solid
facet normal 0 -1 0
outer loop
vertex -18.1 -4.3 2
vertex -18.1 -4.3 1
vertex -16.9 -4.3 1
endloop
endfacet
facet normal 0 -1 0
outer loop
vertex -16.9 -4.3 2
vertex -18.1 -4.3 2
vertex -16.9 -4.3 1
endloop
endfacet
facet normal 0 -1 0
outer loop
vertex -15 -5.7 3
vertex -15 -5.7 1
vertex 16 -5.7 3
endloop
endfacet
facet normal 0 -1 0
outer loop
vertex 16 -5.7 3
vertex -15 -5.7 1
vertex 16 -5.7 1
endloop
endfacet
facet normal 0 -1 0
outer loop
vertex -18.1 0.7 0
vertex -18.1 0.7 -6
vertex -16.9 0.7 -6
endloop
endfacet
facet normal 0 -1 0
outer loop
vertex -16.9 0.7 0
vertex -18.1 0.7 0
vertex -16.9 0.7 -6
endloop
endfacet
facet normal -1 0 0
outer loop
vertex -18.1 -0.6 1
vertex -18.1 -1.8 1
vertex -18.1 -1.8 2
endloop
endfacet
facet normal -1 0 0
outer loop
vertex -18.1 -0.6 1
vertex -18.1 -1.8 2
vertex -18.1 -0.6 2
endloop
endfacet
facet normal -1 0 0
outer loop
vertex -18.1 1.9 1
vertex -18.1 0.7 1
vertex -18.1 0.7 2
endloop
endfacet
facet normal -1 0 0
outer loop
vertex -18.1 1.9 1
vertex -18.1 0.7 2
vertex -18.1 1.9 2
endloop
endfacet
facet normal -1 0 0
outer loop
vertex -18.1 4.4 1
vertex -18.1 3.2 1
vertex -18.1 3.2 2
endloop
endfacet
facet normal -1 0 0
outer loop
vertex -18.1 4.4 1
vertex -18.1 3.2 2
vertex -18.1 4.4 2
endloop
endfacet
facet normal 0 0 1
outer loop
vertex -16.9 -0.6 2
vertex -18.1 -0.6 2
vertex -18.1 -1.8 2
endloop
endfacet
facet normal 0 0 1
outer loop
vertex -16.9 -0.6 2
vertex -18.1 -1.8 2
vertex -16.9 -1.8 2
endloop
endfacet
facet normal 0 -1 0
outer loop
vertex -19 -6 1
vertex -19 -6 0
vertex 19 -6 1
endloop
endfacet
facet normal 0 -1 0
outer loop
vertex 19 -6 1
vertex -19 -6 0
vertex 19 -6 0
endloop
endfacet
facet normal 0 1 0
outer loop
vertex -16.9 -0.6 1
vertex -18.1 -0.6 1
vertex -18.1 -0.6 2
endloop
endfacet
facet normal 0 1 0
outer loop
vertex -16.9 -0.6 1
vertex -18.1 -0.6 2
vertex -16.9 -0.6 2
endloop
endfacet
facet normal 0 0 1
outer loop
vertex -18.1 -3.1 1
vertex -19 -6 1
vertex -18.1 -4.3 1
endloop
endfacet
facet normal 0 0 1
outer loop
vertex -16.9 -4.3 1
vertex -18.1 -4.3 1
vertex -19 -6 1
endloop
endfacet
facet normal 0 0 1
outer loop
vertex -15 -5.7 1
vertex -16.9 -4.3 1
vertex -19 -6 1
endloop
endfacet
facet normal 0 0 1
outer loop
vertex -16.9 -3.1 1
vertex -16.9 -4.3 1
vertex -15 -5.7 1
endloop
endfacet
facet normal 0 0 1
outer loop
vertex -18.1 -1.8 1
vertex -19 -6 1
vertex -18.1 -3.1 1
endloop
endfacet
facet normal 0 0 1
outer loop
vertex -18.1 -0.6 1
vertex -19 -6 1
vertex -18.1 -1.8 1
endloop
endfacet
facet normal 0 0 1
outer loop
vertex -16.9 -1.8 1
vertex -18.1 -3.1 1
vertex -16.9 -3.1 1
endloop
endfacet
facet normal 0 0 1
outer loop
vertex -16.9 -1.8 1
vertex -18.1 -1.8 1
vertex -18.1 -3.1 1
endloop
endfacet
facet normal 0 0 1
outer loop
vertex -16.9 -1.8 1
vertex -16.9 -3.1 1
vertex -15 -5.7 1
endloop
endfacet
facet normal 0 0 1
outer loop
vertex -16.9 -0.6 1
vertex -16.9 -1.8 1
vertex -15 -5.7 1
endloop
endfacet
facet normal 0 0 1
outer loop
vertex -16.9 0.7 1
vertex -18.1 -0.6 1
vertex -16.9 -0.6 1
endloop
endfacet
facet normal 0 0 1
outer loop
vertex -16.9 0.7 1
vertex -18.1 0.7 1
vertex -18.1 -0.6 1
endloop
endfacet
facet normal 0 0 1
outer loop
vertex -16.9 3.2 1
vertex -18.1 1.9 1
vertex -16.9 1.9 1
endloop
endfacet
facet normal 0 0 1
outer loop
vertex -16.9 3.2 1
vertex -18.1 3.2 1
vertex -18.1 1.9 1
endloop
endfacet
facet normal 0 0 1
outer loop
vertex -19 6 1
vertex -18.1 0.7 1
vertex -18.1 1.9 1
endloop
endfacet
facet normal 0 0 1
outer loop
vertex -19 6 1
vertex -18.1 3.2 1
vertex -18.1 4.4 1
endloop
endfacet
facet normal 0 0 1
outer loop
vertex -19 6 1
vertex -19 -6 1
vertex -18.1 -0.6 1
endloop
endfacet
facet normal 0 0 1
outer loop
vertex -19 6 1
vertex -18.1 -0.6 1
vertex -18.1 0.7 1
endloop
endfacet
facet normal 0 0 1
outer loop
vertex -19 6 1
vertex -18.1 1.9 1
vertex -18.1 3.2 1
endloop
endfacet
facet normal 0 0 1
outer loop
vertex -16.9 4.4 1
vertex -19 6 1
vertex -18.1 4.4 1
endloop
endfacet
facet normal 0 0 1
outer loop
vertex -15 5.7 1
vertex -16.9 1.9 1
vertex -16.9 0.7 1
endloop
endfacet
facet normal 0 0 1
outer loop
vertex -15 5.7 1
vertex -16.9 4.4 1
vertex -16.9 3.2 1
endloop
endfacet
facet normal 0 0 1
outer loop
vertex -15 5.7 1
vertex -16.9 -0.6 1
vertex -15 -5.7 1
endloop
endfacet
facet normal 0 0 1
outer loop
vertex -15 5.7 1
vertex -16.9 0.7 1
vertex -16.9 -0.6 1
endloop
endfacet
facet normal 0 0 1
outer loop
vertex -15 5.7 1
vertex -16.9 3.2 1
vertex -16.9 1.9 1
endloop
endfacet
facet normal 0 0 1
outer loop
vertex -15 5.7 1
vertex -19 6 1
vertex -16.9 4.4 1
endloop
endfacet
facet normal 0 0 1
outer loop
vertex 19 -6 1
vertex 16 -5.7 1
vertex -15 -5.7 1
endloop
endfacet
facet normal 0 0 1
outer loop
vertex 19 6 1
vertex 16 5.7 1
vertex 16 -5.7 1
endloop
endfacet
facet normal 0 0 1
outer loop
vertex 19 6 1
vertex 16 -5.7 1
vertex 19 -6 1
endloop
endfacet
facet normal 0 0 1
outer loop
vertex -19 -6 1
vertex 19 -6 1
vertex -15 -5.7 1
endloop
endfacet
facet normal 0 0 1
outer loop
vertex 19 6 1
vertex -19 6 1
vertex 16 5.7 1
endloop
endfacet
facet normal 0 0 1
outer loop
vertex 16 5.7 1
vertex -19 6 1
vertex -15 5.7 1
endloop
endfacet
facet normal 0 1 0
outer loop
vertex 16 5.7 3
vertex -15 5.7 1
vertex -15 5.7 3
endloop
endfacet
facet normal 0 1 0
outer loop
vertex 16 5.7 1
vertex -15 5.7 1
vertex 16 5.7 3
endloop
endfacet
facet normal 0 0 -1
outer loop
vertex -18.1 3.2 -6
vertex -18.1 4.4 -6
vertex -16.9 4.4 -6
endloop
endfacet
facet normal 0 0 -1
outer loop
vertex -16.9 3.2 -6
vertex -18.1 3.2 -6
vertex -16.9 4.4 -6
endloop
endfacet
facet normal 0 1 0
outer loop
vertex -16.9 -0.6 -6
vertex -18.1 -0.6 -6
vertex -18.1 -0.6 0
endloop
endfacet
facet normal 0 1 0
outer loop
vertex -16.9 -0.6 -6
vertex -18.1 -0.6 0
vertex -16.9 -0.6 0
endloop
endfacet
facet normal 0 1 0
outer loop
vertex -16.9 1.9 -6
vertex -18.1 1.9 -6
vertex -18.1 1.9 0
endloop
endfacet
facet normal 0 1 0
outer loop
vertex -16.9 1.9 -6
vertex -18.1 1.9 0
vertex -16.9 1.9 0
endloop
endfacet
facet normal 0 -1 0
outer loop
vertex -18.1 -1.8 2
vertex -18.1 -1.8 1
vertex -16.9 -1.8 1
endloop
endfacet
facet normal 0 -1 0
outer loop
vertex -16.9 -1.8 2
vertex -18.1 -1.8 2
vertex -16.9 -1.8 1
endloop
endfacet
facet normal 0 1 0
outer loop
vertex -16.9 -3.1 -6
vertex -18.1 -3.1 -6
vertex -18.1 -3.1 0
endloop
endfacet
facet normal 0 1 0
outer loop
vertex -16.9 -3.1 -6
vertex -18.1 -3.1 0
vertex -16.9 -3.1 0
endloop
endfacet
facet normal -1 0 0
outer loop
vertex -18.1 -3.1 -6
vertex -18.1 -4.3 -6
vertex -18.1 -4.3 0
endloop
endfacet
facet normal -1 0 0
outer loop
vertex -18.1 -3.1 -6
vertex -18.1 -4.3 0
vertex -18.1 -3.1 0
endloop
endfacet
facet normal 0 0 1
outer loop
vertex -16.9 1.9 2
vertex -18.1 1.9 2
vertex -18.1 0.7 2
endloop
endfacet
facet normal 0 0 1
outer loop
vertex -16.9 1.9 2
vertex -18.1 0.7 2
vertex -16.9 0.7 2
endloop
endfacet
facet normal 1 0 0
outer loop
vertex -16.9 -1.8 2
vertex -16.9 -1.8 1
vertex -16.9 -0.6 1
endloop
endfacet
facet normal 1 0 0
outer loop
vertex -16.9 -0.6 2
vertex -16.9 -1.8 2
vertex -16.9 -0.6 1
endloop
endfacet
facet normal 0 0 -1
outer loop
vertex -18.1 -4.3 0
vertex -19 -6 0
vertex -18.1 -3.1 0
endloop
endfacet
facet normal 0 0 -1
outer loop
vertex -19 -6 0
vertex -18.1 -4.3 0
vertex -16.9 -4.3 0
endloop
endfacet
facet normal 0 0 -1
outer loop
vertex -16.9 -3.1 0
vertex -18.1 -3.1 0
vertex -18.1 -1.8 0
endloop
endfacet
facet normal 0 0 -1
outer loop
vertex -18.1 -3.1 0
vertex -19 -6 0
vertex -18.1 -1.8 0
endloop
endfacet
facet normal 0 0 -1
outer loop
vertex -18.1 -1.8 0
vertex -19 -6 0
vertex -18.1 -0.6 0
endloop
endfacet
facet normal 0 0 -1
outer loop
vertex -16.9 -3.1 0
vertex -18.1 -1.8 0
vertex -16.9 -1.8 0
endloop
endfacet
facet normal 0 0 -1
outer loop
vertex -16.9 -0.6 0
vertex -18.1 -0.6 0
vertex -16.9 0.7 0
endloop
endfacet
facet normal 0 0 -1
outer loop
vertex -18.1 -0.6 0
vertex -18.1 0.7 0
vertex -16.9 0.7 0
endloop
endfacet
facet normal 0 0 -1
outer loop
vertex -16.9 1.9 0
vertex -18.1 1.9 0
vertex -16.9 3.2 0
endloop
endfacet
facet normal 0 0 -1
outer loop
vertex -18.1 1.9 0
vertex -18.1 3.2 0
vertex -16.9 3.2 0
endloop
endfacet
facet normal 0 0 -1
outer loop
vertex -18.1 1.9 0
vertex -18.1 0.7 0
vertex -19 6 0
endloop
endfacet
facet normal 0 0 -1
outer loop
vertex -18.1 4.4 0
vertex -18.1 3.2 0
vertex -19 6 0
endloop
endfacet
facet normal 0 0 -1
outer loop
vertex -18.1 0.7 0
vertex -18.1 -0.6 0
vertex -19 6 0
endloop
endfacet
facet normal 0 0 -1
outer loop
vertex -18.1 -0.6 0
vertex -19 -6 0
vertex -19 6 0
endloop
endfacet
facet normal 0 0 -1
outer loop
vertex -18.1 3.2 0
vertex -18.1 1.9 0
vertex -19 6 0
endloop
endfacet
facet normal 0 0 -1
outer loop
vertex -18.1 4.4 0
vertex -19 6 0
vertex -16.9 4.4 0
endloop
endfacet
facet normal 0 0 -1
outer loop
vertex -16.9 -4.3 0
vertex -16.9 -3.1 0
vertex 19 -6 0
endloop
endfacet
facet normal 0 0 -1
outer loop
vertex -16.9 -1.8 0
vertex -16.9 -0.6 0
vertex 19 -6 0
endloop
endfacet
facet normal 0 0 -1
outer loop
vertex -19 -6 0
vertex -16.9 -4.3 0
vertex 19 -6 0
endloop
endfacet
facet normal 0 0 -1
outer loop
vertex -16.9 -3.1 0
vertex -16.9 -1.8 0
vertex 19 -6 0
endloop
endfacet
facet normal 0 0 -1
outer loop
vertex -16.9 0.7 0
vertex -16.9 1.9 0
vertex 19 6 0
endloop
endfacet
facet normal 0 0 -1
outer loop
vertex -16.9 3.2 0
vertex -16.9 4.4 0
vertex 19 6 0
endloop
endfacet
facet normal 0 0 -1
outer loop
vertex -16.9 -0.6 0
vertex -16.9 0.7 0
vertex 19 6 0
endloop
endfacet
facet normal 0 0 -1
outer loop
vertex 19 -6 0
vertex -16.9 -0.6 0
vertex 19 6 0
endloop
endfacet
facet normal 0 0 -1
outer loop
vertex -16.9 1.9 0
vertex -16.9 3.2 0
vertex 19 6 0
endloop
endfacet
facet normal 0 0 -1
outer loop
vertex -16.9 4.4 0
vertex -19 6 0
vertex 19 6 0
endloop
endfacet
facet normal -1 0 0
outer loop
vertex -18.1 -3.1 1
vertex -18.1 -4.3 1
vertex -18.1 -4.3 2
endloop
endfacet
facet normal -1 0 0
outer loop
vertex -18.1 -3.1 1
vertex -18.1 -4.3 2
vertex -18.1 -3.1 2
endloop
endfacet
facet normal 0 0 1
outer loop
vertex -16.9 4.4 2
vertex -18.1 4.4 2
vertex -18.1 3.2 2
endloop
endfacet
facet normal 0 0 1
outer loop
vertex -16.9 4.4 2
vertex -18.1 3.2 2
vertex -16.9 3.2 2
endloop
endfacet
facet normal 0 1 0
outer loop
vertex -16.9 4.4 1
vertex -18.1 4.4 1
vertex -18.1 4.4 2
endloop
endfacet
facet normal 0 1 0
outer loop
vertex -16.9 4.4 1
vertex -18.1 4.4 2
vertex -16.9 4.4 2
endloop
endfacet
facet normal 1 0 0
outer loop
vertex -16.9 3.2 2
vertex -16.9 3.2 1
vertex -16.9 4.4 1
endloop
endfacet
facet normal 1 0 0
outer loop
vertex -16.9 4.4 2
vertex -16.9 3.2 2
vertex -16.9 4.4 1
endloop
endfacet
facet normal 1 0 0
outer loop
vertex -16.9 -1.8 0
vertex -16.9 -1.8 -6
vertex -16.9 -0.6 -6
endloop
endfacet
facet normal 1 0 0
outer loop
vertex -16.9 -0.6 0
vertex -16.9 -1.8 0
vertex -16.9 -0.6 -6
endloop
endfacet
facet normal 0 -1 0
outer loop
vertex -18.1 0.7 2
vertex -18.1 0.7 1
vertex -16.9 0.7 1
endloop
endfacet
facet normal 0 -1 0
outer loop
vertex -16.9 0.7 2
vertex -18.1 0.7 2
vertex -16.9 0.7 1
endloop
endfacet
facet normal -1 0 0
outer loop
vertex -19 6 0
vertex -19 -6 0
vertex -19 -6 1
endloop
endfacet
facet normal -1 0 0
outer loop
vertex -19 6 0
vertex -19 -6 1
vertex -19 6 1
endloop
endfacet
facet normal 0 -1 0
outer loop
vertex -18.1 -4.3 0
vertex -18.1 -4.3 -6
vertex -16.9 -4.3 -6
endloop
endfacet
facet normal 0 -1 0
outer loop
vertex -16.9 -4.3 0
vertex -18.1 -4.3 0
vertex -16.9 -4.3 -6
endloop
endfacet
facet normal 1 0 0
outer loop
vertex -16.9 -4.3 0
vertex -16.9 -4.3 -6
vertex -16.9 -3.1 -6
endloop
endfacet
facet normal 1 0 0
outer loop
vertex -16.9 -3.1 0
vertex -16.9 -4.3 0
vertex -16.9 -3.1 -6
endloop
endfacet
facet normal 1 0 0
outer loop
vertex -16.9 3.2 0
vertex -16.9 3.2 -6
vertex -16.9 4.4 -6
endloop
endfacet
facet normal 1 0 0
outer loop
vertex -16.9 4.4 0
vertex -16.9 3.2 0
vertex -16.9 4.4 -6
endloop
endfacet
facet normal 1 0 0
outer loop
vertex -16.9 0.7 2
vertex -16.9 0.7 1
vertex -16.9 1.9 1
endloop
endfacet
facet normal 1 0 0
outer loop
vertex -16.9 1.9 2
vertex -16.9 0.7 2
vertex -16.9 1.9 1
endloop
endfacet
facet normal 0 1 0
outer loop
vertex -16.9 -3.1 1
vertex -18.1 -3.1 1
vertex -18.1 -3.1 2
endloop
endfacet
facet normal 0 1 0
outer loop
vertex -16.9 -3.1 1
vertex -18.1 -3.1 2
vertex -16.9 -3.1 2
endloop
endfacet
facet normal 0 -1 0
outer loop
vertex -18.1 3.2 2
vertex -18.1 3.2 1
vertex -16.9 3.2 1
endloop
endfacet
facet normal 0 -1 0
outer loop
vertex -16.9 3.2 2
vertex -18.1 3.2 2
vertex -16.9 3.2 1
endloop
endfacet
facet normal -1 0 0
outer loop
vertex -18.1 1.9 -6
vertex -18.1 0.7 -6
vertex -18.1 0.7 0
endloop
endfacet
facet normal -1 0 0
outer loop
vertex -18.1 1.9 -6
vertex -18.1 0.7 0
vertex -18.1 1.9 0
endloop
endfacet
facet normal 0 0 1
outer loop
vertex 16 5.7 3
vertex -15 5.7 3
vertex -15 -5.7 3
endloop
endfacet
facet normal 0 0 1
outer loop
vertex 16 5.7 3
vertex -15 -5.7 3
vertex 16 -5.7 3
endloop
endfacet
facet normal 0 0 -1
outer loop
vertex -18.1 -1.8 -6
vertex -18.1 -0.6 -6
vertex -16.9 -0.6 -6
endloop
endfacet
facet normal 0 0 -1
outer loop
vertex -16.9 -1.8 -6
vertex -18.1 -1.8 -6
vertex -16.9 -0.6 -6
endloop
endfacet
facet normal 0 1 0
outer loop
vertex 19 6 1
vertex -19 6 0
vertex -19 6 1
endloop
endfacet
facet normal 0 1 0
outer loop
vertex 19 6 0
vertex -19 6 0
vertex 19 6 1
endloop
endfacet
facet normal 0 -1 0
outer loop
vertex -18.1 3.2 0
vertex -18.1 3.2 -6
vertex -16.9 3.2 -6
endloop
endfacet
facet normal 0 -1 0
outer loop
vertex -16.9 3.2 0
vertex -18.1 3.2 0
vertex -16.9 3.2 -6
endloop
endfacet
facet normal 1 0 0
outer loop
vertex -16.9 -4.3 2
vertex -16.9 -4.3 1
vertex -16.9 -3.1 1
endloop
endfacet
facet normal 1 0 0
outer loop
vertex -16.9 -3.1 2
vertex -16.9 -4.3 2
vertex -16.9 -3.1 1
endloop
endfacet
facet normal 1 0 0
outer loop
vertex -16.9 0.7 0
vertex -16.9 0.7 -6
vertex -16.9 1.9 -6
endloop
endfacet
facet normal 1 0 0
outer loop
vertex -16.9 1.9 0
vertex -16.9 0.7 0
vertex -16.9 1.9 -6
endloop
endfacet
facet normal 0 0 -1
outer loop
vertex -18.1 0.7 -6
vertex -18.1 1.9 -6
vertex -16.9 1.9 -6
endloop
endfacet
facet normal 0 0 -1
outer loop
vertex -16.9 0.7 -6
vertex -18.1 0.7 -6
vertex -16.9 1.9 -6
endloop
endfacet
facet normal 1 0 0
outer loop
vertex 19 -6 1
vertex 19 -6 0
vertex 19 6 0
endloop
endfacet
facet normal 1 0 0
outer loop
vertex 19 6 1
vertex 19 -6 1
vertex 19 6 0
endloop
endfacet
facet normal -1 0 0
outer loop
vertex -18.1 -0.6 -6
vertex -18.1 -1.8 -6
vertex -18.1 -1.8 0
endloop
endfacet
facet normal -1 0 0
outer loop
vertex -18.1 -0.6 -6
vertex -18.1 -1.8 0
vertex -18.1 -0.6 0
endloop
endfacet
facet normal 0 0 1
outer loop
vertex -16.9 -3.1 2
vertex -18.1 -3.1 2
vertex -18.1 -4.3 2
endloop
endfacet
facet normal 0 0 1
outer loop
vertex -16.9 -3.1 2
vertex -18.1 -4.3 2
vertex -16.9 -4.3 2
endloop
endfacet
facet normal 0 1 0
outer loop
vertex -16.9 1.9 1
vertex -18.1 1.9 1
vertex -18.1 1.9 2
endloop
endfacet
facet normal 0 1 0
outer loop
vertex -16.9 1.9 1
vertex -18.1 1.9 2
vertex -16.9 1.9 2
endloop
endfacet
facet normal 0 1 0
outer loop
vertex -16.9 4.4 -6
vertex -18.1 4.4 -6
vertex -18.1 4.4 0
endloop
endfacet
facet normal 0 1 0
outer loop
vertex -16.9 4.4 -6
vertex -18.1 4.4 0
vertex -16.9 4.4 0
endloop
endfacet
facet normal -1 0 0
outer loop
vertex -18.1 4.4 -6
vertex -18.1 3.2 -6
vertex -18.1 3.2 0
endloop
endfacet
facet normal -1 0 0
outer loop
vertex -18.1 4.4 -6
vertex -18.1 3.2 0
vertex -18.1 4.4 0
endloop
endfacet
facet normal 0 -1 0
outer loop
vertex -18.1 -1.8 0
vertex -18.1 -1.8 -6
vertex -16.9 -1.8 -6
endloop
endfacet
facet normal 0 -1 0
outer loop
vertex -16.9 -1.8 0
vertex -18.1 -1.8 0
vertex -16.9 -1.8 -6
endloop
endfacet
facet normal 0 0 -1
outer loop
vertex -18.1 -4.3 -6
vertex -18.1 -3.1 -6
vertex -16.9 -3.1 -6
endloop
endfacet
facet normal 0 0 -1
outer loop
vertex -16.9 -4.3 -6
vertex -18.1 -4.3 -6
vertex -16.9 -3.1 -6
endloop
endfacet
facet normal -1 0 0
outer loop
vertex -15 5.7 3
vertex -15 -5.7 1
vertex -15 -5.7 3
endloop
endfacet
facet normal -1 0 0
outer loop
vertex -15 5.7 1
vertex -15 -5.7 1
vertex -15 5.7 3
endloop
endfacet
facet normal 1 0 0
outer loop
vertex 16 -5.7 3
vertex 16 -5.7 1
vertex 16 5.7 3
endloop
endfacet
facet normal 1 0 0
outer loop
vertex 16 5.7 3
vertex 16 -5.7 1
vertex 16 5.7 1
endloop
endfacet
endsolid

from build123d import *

# Parameters (mm, degrees)
SKETCH_1_W           = 38
SKETCH_1_H           = 12
EXTRUDE_4_DEPTH      = 1
SKETCH_2_W           = 31
SKETCH_2_H           = 11.4
EXTRUDE_5_DEPTH      = 3
SKETCH_3_W           = 1.2
SKETCH_3_H           = 1.2
EXTRUDE_6_DEPTH      = 2
EXTRUDE_7_DEPTH      = 2
EXTRUDE_7_DEPTH_BACK = 6
SKETCH_3_5_W         = 1.2
SKETCH_3_5_H         = 1.2


with BuildPart() as part:
    # ｽｹｯﾁ1 → ﾎﾞｽ - 押し出し4 (new body)
    with BuildSketch(Plane.XY):
        Rectangle(SKETCH_1_W, SKETCH_1_H)
    extrude(amount=EXTRUDE_4_DEPTH)

    # ｽｹｯﾁ2 → ﾎﾞｽ - 押し出し5 (add)
    with BuildSketch(Plane.XY):
        with Locations((0.5, 0)):
            Rectangle(SKETCH_2_W, SKETCH_2_H)
    extrude(amount=EXTRUDE_5_DEPTH)

    # ｽｹｯﾁ3 → ﾎﾞｽ - 押し出し6 (add)
    with BuildSketch(Plane.XY):
        with Locations((-17.5, 3.8)):
            Rectangle(SKETCH_3_W, SKETCH_3_H)
        with Locations((-17.5, 1.3)):
            Rectangle(SKETCH_3_W, SKETCH_3_H)
        with Locations((-17.5, -1.2)):
            Rectangle(SKETCH_3_W, SKETCH_3_H)
        with Locations((-17.5, -3.7)):
            Rectangle(SKETCH_3_W, SKETCH_3_H)
    extrude(amount=EXTRUDE_6_DEPTH)

    # ｽｹｯﾁ3<5> → ﾎﾞｽ - 押し出し7 (add, two sides: drawn at the far end of the back side and taken through both)
    with BuildSketch(Plane.XY.offset(-EXTRUDE_7_DEPTH_BACK)):
        with Locations((-17.5, 3.8)):
            Rectangle(SKETCH_3_5_W, SKETCH_3_5_H)
        with Locations((-17.5, 1.3)):
            Rectangle(SKETCH_3_5_W, SKETCH_3_5_H)
        with Locations((-17.5, -1.2)):
            Rectangle(SKETCH_3_5_W, SKETCH_3_5_H)
        with Locations((-17.5, -3.7)):
            Rectangle(SKETCH_3_5_W, SKETCH_3_5_H)
    extrude(amount=EXTRUDE_7_DEPTH + EXTRUDE_7_DEPTH_BACK)


solid = part.part
